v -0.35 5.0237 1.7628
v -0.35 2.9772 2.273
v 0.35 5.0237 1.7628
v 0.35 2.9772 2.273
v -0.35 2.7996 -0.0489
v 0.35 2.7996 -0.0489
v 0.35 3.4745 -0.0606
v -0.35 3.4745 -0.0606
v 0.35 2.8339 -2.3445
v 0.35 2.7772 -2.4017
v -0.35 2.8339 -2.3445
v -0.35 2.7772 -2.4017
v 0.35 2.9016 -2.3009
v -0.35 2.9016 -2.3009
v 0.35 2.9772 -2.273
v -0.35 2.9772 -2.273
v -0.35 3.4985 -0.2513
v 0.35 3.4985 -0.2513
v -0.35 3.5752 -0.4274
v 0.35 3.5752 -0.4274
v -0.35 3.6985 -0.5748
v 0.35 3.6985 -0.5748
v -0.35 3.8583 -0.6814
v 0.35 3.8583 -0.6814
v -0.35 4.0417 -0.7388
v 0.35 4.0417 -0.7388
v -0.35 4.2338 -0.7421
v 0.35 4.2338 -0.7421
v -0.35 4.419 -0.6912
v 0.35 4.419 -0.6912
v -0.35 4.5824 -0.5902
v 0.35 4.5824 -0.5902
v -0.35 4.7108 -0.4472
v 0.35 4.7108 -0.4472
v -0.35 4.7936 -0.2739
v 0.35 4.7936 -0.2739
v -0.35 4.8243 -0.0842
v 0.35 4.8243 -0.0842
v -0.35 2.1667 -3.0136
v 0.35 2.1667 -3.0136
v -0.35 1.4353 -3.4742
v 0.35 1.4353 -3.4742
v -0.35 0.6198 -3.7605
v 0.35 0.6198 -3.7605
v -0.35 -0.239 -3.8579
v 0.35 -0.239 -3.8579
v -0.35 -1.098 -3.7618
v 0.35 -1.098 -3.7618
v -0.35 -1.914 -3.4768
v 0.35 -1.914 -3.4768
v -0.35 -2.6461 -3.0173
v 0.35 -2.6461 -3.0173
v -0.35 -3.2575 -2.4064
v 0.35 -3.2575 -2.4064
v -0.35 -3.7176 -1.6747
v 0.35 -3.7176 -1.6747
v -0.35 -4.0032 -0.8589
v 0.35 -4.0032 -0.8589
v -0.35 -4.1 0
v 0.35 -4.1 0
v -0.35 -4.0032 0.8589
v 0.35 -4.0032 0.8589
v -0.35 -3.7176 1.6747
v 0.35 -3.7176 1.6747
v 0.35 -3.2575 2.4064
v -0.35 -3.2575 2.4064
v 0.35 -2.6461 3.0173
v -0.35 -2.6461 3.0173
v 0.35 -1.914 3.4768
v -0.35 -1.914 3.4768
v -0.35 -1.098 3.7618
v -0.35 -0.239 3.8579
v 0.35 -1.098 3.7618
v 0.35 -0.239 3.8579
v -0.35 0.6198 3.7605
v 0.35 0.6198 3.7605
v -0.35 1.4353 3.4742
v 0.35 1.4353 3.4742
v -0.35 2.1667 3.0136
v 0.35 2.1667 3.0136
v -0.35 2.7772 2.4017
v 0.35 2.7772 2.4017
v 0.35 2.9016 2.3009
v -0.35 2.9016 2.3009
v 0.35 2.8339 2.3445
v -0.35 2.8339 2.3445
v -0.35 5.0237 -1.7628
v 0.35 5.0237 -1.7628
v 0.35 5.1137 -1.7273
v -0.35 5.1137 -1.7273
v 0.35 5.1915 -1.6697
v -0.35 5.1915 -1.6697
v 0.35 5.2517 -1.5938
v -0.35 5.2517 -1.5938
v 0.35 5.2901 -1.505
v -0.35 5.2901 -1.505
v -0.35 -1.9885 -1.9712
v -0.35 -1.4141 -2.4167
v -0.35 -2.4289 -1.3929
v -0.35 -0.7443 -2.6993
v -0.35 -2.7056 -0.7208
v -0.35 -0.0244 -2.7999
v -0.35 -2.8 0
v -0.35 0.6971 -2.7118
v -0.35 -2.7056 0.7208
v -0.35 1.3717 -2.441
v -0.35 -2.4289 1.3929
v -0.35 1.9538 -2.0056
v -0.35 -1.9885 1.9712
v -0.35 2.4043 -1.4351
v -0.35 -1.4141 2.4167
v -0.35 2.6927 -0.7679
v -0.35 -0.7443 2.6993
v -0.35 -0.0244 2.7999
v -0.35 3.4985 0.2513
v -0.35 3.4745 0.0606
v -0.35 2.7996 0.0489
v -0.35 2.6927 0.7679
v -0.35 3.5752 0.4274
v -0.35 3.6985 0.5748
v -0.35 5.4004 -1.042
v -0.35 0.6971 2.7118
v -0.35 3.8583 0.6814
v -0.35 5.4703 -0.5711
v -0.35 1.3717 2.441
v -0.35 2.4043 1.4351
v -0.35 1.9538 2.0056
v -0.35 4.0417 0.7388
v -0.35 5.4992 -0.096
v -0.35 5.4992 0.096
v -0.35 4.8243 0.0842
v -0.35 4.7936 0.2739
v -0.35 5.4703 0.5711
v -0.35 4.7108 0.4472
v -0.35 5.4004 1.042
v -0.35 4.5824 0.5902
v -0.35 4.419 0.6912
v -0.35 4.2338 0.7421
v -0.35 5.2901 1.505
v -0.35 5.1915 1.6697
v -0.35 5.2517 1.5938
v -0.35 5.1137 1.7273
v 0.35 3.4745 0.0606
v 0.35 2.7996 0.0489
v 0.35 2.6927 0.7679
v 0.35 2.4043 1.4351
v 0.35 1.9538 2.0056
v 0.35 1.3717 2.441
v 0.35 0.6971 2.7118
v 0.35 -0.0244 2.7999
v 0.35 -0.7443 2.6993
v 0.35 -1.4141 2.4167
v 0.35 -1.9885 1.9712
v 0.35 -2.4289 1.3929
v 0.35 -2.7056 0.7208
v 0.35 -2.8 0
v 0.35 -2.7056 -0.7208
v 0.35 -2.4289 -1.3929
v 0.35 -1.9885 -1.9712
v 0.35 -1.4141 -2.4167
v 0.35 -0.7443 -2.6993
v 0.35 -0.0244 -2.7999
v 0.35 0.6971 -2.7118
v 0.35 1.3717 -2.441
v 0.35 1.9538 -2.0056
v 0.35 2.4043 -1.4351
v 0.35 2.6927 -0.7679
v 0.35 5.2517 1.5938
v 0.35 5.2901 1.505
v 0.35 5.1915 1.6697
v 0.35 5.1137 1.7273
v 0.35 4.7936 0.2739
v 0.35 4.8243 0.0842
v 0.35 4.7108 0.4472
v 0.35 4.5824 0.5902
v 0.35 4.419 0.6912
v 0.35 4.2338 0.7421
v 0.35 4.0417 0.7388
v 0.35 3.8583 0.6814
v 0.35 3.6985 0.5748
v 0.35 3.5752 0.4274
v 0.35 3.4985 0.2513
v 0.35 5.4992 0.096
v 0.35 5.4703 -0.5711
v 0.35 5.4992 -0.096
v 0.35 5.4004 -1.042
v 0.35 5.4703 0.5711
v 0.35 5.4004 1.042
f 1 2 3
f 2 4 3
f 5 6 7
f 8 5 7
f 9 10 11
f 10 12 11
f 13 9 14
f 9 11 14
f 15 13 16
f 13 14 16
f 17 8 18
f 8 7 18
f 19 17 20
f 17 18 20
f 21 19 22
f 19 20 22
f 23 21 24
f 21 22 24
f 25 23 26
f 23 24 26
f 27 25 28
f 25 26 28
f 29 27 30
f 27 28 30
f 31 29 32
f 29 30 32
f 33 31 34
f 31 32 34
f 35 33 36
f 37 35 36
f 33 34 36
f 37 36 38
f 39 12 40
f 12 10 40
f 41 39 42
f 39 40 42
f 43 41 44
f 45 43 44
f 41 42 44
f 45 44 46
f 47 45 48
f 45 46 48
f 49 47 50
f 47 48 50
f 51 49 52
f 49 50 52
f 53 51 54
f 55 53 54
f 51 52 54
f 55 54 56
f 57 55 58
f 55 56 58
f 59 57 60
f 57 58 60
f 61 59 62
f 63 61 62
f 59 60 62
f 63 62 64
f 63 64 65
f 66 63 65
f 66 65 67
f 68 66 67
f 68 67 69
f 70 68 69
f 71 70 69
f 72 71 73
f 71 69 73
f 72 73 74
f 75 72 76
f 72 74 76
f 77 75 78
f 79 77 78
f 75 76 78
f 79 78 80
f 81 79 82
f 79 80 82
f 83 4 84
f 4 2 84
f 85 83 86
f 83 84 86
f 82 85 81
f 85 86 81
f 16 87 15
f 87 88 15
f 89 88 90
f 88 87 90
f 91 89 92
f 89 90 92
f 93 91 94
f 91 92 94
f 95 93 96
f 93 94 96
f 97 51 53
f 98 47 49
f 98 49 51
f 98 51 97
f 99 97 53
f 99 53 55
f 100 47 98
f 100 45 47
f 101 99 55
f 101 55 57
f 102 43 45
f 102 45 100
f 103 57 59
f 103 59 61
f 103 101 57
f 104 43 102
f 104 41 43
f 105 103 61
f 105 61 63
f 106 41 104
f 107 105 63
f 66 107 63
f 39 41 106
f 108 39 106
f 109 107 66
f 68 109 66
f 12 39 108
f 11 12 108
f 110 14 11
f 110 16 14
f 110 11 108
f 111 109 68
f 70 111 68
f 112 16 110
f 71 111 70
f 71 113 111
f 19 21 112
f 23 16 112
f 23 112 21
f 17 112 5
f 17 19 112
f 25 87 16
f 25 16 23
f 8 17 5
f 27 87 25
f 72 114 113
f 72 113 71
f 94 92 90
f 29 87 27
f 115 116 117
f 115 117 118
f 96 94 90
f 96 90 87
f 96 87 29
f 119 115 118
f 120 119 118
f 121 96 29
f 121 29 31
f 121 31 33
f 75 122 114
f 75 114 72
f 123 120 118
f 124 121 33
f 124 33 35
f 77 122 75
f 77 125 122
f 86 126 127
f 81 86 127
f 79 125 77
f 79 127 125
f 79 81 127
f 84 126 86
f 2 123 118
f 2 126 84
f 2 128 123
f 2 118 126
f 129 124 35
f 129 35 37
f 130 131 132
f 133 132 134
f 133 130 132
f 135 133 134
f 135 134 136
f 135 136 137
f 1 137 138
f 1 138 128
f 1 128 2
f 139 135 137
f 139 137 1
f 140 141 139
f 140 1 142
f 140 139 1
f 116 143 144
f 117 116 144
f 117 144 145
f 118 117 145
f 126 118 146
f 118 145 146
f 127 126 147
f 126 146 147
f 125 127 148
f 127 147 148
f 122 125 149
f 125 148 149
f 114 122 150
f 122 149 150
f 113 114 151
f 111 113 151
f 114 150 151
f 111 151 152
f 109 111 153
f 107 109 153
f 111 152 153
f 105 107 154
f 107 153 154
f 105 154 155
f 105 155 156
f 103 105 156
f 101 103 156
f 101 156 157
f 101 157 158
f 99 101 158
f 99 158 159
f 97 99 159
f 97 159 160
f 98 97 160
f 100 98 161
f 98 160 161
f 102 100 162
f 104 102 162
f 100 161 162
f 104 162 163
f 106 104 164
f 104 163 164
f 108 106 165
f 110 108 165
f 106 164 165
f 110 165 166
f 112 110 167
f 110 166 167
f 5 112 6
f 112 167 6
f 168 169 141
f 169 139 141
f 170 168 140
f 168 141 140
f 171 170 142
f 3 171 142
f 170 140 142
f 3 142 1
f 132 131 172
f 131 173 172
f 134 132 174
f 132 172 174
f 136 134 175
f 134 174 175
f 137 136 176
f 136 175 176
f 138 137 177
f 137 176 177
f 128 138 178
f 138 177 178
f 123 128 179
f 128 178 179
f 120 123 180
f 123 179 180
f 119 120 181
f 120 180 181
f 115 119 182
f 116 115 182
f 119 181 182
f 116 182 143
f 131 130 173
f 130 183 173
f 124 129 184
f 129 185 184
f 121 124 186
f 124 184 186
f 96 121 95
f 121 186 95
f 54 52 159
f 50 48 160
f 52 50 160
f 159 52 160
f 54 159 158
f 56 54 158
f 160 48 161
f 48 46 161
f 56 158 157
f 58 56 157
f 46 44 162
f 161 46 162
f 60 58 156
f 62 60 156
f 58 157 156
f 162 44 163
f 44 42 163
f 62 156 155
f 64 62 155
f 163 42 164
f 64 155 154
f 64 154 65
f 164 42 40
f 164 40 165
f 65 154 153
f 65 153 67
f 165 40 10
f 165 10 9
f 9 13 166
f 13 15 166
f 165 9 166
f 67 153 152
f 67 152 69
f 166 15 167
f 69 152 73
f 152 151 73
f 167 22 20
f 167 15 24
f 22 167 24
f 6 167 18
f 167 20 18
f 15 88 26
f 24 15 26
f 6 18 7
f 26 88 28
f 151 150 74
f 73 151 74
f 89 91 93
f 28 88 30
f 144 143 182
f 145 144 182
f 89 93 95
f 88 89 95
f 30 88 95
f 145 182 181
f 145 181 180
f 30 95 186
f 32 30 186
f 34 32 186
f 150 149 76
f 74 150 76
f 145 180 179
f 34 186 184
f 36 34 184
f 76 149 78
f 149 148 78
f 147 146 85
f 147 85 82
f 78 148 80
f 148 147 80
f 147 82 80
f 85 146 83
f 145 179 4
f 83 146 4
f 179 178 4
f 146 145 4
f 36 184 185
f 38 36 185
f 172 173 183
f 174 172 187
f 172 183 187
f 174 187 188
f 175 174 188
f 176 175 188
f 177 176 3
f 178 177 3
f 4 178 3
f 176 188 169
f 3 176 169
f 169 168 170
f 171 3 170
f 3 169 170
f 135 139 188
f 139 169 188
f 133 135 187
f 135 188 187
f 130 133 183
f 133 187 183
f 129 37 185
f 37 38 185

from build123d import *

# Parameters (mm, degrees)
EXTRUDE1_DEPTH = 0.35
FILLET1_R      = 0.37


with BuildPart() as part:
    # Sketch1 → Extrude1 (new body, symmetric)
    with BuildSketch(Plane(origin=(0, 0, 0), x_dir=(0, 0, -1), z_dir=(1, 0, 0))):
        with BuildLine():
            Line((0.048866738, 2.799573546), (0.060647112, 3.474470741))
            ThreePointArc((0.060647112, 3.474470741), (0.747324681, 4.137587561), (0.084207861, 4.824265129))
            Line((0.084207861, 4.824265129), (0.095988235, 5.499162323))
            ThreePointArc((0.095988235, 5.499162323), (0.91428004, 5.423476008), (1.712160583, 5.226710834))
            Line((1.712160583, 5.226710834), (2.304187375, 2.852221062))
            ThreePointArc((2.304187375, 2.852221062), (0, -4.1), (-2.304187375, 2.852221062))
            Line((-2.304187375, 2.852221062), (-1.712160583, 5.226710834))
            ThreePointArc((-1.712160583, 5.226710834), (-0.91428004, 5.423476008), (-0.095988235, 5.499162323))
            Line((-0.095988235, 5.499162323), (-0.084207861, 4.824265129))
            ThreePointArc((-0.084207861, 4.824265129), (-0.747324681, 4.137587561), (-0.060647112, 3.474470741))
            Line((-0.060647112, 3.474470741), (-0.048866738, 2.799573546))
            ThreePointArc((-0.048866738, 2.799573546), (0, -2.8), (0.048866738, 2.799573546))
        make_face()
    extrude(amount=EXTRUDE1_DEPTH, both=True)

    # Fillet1
    fillet1_edges = [part.edges().sort_by_distance(p)[0] for p in [
        (0, 5.226710834, -1.712160583),
        (0, 2.852221062, -2.304187375),
        (0, 2.852221062, 2.304187375),
        (0, 5.226710834, 1.712160583),
    ]]
    fillet(fillet1_edges, radius=FILLET1_R)


solid = part.part
